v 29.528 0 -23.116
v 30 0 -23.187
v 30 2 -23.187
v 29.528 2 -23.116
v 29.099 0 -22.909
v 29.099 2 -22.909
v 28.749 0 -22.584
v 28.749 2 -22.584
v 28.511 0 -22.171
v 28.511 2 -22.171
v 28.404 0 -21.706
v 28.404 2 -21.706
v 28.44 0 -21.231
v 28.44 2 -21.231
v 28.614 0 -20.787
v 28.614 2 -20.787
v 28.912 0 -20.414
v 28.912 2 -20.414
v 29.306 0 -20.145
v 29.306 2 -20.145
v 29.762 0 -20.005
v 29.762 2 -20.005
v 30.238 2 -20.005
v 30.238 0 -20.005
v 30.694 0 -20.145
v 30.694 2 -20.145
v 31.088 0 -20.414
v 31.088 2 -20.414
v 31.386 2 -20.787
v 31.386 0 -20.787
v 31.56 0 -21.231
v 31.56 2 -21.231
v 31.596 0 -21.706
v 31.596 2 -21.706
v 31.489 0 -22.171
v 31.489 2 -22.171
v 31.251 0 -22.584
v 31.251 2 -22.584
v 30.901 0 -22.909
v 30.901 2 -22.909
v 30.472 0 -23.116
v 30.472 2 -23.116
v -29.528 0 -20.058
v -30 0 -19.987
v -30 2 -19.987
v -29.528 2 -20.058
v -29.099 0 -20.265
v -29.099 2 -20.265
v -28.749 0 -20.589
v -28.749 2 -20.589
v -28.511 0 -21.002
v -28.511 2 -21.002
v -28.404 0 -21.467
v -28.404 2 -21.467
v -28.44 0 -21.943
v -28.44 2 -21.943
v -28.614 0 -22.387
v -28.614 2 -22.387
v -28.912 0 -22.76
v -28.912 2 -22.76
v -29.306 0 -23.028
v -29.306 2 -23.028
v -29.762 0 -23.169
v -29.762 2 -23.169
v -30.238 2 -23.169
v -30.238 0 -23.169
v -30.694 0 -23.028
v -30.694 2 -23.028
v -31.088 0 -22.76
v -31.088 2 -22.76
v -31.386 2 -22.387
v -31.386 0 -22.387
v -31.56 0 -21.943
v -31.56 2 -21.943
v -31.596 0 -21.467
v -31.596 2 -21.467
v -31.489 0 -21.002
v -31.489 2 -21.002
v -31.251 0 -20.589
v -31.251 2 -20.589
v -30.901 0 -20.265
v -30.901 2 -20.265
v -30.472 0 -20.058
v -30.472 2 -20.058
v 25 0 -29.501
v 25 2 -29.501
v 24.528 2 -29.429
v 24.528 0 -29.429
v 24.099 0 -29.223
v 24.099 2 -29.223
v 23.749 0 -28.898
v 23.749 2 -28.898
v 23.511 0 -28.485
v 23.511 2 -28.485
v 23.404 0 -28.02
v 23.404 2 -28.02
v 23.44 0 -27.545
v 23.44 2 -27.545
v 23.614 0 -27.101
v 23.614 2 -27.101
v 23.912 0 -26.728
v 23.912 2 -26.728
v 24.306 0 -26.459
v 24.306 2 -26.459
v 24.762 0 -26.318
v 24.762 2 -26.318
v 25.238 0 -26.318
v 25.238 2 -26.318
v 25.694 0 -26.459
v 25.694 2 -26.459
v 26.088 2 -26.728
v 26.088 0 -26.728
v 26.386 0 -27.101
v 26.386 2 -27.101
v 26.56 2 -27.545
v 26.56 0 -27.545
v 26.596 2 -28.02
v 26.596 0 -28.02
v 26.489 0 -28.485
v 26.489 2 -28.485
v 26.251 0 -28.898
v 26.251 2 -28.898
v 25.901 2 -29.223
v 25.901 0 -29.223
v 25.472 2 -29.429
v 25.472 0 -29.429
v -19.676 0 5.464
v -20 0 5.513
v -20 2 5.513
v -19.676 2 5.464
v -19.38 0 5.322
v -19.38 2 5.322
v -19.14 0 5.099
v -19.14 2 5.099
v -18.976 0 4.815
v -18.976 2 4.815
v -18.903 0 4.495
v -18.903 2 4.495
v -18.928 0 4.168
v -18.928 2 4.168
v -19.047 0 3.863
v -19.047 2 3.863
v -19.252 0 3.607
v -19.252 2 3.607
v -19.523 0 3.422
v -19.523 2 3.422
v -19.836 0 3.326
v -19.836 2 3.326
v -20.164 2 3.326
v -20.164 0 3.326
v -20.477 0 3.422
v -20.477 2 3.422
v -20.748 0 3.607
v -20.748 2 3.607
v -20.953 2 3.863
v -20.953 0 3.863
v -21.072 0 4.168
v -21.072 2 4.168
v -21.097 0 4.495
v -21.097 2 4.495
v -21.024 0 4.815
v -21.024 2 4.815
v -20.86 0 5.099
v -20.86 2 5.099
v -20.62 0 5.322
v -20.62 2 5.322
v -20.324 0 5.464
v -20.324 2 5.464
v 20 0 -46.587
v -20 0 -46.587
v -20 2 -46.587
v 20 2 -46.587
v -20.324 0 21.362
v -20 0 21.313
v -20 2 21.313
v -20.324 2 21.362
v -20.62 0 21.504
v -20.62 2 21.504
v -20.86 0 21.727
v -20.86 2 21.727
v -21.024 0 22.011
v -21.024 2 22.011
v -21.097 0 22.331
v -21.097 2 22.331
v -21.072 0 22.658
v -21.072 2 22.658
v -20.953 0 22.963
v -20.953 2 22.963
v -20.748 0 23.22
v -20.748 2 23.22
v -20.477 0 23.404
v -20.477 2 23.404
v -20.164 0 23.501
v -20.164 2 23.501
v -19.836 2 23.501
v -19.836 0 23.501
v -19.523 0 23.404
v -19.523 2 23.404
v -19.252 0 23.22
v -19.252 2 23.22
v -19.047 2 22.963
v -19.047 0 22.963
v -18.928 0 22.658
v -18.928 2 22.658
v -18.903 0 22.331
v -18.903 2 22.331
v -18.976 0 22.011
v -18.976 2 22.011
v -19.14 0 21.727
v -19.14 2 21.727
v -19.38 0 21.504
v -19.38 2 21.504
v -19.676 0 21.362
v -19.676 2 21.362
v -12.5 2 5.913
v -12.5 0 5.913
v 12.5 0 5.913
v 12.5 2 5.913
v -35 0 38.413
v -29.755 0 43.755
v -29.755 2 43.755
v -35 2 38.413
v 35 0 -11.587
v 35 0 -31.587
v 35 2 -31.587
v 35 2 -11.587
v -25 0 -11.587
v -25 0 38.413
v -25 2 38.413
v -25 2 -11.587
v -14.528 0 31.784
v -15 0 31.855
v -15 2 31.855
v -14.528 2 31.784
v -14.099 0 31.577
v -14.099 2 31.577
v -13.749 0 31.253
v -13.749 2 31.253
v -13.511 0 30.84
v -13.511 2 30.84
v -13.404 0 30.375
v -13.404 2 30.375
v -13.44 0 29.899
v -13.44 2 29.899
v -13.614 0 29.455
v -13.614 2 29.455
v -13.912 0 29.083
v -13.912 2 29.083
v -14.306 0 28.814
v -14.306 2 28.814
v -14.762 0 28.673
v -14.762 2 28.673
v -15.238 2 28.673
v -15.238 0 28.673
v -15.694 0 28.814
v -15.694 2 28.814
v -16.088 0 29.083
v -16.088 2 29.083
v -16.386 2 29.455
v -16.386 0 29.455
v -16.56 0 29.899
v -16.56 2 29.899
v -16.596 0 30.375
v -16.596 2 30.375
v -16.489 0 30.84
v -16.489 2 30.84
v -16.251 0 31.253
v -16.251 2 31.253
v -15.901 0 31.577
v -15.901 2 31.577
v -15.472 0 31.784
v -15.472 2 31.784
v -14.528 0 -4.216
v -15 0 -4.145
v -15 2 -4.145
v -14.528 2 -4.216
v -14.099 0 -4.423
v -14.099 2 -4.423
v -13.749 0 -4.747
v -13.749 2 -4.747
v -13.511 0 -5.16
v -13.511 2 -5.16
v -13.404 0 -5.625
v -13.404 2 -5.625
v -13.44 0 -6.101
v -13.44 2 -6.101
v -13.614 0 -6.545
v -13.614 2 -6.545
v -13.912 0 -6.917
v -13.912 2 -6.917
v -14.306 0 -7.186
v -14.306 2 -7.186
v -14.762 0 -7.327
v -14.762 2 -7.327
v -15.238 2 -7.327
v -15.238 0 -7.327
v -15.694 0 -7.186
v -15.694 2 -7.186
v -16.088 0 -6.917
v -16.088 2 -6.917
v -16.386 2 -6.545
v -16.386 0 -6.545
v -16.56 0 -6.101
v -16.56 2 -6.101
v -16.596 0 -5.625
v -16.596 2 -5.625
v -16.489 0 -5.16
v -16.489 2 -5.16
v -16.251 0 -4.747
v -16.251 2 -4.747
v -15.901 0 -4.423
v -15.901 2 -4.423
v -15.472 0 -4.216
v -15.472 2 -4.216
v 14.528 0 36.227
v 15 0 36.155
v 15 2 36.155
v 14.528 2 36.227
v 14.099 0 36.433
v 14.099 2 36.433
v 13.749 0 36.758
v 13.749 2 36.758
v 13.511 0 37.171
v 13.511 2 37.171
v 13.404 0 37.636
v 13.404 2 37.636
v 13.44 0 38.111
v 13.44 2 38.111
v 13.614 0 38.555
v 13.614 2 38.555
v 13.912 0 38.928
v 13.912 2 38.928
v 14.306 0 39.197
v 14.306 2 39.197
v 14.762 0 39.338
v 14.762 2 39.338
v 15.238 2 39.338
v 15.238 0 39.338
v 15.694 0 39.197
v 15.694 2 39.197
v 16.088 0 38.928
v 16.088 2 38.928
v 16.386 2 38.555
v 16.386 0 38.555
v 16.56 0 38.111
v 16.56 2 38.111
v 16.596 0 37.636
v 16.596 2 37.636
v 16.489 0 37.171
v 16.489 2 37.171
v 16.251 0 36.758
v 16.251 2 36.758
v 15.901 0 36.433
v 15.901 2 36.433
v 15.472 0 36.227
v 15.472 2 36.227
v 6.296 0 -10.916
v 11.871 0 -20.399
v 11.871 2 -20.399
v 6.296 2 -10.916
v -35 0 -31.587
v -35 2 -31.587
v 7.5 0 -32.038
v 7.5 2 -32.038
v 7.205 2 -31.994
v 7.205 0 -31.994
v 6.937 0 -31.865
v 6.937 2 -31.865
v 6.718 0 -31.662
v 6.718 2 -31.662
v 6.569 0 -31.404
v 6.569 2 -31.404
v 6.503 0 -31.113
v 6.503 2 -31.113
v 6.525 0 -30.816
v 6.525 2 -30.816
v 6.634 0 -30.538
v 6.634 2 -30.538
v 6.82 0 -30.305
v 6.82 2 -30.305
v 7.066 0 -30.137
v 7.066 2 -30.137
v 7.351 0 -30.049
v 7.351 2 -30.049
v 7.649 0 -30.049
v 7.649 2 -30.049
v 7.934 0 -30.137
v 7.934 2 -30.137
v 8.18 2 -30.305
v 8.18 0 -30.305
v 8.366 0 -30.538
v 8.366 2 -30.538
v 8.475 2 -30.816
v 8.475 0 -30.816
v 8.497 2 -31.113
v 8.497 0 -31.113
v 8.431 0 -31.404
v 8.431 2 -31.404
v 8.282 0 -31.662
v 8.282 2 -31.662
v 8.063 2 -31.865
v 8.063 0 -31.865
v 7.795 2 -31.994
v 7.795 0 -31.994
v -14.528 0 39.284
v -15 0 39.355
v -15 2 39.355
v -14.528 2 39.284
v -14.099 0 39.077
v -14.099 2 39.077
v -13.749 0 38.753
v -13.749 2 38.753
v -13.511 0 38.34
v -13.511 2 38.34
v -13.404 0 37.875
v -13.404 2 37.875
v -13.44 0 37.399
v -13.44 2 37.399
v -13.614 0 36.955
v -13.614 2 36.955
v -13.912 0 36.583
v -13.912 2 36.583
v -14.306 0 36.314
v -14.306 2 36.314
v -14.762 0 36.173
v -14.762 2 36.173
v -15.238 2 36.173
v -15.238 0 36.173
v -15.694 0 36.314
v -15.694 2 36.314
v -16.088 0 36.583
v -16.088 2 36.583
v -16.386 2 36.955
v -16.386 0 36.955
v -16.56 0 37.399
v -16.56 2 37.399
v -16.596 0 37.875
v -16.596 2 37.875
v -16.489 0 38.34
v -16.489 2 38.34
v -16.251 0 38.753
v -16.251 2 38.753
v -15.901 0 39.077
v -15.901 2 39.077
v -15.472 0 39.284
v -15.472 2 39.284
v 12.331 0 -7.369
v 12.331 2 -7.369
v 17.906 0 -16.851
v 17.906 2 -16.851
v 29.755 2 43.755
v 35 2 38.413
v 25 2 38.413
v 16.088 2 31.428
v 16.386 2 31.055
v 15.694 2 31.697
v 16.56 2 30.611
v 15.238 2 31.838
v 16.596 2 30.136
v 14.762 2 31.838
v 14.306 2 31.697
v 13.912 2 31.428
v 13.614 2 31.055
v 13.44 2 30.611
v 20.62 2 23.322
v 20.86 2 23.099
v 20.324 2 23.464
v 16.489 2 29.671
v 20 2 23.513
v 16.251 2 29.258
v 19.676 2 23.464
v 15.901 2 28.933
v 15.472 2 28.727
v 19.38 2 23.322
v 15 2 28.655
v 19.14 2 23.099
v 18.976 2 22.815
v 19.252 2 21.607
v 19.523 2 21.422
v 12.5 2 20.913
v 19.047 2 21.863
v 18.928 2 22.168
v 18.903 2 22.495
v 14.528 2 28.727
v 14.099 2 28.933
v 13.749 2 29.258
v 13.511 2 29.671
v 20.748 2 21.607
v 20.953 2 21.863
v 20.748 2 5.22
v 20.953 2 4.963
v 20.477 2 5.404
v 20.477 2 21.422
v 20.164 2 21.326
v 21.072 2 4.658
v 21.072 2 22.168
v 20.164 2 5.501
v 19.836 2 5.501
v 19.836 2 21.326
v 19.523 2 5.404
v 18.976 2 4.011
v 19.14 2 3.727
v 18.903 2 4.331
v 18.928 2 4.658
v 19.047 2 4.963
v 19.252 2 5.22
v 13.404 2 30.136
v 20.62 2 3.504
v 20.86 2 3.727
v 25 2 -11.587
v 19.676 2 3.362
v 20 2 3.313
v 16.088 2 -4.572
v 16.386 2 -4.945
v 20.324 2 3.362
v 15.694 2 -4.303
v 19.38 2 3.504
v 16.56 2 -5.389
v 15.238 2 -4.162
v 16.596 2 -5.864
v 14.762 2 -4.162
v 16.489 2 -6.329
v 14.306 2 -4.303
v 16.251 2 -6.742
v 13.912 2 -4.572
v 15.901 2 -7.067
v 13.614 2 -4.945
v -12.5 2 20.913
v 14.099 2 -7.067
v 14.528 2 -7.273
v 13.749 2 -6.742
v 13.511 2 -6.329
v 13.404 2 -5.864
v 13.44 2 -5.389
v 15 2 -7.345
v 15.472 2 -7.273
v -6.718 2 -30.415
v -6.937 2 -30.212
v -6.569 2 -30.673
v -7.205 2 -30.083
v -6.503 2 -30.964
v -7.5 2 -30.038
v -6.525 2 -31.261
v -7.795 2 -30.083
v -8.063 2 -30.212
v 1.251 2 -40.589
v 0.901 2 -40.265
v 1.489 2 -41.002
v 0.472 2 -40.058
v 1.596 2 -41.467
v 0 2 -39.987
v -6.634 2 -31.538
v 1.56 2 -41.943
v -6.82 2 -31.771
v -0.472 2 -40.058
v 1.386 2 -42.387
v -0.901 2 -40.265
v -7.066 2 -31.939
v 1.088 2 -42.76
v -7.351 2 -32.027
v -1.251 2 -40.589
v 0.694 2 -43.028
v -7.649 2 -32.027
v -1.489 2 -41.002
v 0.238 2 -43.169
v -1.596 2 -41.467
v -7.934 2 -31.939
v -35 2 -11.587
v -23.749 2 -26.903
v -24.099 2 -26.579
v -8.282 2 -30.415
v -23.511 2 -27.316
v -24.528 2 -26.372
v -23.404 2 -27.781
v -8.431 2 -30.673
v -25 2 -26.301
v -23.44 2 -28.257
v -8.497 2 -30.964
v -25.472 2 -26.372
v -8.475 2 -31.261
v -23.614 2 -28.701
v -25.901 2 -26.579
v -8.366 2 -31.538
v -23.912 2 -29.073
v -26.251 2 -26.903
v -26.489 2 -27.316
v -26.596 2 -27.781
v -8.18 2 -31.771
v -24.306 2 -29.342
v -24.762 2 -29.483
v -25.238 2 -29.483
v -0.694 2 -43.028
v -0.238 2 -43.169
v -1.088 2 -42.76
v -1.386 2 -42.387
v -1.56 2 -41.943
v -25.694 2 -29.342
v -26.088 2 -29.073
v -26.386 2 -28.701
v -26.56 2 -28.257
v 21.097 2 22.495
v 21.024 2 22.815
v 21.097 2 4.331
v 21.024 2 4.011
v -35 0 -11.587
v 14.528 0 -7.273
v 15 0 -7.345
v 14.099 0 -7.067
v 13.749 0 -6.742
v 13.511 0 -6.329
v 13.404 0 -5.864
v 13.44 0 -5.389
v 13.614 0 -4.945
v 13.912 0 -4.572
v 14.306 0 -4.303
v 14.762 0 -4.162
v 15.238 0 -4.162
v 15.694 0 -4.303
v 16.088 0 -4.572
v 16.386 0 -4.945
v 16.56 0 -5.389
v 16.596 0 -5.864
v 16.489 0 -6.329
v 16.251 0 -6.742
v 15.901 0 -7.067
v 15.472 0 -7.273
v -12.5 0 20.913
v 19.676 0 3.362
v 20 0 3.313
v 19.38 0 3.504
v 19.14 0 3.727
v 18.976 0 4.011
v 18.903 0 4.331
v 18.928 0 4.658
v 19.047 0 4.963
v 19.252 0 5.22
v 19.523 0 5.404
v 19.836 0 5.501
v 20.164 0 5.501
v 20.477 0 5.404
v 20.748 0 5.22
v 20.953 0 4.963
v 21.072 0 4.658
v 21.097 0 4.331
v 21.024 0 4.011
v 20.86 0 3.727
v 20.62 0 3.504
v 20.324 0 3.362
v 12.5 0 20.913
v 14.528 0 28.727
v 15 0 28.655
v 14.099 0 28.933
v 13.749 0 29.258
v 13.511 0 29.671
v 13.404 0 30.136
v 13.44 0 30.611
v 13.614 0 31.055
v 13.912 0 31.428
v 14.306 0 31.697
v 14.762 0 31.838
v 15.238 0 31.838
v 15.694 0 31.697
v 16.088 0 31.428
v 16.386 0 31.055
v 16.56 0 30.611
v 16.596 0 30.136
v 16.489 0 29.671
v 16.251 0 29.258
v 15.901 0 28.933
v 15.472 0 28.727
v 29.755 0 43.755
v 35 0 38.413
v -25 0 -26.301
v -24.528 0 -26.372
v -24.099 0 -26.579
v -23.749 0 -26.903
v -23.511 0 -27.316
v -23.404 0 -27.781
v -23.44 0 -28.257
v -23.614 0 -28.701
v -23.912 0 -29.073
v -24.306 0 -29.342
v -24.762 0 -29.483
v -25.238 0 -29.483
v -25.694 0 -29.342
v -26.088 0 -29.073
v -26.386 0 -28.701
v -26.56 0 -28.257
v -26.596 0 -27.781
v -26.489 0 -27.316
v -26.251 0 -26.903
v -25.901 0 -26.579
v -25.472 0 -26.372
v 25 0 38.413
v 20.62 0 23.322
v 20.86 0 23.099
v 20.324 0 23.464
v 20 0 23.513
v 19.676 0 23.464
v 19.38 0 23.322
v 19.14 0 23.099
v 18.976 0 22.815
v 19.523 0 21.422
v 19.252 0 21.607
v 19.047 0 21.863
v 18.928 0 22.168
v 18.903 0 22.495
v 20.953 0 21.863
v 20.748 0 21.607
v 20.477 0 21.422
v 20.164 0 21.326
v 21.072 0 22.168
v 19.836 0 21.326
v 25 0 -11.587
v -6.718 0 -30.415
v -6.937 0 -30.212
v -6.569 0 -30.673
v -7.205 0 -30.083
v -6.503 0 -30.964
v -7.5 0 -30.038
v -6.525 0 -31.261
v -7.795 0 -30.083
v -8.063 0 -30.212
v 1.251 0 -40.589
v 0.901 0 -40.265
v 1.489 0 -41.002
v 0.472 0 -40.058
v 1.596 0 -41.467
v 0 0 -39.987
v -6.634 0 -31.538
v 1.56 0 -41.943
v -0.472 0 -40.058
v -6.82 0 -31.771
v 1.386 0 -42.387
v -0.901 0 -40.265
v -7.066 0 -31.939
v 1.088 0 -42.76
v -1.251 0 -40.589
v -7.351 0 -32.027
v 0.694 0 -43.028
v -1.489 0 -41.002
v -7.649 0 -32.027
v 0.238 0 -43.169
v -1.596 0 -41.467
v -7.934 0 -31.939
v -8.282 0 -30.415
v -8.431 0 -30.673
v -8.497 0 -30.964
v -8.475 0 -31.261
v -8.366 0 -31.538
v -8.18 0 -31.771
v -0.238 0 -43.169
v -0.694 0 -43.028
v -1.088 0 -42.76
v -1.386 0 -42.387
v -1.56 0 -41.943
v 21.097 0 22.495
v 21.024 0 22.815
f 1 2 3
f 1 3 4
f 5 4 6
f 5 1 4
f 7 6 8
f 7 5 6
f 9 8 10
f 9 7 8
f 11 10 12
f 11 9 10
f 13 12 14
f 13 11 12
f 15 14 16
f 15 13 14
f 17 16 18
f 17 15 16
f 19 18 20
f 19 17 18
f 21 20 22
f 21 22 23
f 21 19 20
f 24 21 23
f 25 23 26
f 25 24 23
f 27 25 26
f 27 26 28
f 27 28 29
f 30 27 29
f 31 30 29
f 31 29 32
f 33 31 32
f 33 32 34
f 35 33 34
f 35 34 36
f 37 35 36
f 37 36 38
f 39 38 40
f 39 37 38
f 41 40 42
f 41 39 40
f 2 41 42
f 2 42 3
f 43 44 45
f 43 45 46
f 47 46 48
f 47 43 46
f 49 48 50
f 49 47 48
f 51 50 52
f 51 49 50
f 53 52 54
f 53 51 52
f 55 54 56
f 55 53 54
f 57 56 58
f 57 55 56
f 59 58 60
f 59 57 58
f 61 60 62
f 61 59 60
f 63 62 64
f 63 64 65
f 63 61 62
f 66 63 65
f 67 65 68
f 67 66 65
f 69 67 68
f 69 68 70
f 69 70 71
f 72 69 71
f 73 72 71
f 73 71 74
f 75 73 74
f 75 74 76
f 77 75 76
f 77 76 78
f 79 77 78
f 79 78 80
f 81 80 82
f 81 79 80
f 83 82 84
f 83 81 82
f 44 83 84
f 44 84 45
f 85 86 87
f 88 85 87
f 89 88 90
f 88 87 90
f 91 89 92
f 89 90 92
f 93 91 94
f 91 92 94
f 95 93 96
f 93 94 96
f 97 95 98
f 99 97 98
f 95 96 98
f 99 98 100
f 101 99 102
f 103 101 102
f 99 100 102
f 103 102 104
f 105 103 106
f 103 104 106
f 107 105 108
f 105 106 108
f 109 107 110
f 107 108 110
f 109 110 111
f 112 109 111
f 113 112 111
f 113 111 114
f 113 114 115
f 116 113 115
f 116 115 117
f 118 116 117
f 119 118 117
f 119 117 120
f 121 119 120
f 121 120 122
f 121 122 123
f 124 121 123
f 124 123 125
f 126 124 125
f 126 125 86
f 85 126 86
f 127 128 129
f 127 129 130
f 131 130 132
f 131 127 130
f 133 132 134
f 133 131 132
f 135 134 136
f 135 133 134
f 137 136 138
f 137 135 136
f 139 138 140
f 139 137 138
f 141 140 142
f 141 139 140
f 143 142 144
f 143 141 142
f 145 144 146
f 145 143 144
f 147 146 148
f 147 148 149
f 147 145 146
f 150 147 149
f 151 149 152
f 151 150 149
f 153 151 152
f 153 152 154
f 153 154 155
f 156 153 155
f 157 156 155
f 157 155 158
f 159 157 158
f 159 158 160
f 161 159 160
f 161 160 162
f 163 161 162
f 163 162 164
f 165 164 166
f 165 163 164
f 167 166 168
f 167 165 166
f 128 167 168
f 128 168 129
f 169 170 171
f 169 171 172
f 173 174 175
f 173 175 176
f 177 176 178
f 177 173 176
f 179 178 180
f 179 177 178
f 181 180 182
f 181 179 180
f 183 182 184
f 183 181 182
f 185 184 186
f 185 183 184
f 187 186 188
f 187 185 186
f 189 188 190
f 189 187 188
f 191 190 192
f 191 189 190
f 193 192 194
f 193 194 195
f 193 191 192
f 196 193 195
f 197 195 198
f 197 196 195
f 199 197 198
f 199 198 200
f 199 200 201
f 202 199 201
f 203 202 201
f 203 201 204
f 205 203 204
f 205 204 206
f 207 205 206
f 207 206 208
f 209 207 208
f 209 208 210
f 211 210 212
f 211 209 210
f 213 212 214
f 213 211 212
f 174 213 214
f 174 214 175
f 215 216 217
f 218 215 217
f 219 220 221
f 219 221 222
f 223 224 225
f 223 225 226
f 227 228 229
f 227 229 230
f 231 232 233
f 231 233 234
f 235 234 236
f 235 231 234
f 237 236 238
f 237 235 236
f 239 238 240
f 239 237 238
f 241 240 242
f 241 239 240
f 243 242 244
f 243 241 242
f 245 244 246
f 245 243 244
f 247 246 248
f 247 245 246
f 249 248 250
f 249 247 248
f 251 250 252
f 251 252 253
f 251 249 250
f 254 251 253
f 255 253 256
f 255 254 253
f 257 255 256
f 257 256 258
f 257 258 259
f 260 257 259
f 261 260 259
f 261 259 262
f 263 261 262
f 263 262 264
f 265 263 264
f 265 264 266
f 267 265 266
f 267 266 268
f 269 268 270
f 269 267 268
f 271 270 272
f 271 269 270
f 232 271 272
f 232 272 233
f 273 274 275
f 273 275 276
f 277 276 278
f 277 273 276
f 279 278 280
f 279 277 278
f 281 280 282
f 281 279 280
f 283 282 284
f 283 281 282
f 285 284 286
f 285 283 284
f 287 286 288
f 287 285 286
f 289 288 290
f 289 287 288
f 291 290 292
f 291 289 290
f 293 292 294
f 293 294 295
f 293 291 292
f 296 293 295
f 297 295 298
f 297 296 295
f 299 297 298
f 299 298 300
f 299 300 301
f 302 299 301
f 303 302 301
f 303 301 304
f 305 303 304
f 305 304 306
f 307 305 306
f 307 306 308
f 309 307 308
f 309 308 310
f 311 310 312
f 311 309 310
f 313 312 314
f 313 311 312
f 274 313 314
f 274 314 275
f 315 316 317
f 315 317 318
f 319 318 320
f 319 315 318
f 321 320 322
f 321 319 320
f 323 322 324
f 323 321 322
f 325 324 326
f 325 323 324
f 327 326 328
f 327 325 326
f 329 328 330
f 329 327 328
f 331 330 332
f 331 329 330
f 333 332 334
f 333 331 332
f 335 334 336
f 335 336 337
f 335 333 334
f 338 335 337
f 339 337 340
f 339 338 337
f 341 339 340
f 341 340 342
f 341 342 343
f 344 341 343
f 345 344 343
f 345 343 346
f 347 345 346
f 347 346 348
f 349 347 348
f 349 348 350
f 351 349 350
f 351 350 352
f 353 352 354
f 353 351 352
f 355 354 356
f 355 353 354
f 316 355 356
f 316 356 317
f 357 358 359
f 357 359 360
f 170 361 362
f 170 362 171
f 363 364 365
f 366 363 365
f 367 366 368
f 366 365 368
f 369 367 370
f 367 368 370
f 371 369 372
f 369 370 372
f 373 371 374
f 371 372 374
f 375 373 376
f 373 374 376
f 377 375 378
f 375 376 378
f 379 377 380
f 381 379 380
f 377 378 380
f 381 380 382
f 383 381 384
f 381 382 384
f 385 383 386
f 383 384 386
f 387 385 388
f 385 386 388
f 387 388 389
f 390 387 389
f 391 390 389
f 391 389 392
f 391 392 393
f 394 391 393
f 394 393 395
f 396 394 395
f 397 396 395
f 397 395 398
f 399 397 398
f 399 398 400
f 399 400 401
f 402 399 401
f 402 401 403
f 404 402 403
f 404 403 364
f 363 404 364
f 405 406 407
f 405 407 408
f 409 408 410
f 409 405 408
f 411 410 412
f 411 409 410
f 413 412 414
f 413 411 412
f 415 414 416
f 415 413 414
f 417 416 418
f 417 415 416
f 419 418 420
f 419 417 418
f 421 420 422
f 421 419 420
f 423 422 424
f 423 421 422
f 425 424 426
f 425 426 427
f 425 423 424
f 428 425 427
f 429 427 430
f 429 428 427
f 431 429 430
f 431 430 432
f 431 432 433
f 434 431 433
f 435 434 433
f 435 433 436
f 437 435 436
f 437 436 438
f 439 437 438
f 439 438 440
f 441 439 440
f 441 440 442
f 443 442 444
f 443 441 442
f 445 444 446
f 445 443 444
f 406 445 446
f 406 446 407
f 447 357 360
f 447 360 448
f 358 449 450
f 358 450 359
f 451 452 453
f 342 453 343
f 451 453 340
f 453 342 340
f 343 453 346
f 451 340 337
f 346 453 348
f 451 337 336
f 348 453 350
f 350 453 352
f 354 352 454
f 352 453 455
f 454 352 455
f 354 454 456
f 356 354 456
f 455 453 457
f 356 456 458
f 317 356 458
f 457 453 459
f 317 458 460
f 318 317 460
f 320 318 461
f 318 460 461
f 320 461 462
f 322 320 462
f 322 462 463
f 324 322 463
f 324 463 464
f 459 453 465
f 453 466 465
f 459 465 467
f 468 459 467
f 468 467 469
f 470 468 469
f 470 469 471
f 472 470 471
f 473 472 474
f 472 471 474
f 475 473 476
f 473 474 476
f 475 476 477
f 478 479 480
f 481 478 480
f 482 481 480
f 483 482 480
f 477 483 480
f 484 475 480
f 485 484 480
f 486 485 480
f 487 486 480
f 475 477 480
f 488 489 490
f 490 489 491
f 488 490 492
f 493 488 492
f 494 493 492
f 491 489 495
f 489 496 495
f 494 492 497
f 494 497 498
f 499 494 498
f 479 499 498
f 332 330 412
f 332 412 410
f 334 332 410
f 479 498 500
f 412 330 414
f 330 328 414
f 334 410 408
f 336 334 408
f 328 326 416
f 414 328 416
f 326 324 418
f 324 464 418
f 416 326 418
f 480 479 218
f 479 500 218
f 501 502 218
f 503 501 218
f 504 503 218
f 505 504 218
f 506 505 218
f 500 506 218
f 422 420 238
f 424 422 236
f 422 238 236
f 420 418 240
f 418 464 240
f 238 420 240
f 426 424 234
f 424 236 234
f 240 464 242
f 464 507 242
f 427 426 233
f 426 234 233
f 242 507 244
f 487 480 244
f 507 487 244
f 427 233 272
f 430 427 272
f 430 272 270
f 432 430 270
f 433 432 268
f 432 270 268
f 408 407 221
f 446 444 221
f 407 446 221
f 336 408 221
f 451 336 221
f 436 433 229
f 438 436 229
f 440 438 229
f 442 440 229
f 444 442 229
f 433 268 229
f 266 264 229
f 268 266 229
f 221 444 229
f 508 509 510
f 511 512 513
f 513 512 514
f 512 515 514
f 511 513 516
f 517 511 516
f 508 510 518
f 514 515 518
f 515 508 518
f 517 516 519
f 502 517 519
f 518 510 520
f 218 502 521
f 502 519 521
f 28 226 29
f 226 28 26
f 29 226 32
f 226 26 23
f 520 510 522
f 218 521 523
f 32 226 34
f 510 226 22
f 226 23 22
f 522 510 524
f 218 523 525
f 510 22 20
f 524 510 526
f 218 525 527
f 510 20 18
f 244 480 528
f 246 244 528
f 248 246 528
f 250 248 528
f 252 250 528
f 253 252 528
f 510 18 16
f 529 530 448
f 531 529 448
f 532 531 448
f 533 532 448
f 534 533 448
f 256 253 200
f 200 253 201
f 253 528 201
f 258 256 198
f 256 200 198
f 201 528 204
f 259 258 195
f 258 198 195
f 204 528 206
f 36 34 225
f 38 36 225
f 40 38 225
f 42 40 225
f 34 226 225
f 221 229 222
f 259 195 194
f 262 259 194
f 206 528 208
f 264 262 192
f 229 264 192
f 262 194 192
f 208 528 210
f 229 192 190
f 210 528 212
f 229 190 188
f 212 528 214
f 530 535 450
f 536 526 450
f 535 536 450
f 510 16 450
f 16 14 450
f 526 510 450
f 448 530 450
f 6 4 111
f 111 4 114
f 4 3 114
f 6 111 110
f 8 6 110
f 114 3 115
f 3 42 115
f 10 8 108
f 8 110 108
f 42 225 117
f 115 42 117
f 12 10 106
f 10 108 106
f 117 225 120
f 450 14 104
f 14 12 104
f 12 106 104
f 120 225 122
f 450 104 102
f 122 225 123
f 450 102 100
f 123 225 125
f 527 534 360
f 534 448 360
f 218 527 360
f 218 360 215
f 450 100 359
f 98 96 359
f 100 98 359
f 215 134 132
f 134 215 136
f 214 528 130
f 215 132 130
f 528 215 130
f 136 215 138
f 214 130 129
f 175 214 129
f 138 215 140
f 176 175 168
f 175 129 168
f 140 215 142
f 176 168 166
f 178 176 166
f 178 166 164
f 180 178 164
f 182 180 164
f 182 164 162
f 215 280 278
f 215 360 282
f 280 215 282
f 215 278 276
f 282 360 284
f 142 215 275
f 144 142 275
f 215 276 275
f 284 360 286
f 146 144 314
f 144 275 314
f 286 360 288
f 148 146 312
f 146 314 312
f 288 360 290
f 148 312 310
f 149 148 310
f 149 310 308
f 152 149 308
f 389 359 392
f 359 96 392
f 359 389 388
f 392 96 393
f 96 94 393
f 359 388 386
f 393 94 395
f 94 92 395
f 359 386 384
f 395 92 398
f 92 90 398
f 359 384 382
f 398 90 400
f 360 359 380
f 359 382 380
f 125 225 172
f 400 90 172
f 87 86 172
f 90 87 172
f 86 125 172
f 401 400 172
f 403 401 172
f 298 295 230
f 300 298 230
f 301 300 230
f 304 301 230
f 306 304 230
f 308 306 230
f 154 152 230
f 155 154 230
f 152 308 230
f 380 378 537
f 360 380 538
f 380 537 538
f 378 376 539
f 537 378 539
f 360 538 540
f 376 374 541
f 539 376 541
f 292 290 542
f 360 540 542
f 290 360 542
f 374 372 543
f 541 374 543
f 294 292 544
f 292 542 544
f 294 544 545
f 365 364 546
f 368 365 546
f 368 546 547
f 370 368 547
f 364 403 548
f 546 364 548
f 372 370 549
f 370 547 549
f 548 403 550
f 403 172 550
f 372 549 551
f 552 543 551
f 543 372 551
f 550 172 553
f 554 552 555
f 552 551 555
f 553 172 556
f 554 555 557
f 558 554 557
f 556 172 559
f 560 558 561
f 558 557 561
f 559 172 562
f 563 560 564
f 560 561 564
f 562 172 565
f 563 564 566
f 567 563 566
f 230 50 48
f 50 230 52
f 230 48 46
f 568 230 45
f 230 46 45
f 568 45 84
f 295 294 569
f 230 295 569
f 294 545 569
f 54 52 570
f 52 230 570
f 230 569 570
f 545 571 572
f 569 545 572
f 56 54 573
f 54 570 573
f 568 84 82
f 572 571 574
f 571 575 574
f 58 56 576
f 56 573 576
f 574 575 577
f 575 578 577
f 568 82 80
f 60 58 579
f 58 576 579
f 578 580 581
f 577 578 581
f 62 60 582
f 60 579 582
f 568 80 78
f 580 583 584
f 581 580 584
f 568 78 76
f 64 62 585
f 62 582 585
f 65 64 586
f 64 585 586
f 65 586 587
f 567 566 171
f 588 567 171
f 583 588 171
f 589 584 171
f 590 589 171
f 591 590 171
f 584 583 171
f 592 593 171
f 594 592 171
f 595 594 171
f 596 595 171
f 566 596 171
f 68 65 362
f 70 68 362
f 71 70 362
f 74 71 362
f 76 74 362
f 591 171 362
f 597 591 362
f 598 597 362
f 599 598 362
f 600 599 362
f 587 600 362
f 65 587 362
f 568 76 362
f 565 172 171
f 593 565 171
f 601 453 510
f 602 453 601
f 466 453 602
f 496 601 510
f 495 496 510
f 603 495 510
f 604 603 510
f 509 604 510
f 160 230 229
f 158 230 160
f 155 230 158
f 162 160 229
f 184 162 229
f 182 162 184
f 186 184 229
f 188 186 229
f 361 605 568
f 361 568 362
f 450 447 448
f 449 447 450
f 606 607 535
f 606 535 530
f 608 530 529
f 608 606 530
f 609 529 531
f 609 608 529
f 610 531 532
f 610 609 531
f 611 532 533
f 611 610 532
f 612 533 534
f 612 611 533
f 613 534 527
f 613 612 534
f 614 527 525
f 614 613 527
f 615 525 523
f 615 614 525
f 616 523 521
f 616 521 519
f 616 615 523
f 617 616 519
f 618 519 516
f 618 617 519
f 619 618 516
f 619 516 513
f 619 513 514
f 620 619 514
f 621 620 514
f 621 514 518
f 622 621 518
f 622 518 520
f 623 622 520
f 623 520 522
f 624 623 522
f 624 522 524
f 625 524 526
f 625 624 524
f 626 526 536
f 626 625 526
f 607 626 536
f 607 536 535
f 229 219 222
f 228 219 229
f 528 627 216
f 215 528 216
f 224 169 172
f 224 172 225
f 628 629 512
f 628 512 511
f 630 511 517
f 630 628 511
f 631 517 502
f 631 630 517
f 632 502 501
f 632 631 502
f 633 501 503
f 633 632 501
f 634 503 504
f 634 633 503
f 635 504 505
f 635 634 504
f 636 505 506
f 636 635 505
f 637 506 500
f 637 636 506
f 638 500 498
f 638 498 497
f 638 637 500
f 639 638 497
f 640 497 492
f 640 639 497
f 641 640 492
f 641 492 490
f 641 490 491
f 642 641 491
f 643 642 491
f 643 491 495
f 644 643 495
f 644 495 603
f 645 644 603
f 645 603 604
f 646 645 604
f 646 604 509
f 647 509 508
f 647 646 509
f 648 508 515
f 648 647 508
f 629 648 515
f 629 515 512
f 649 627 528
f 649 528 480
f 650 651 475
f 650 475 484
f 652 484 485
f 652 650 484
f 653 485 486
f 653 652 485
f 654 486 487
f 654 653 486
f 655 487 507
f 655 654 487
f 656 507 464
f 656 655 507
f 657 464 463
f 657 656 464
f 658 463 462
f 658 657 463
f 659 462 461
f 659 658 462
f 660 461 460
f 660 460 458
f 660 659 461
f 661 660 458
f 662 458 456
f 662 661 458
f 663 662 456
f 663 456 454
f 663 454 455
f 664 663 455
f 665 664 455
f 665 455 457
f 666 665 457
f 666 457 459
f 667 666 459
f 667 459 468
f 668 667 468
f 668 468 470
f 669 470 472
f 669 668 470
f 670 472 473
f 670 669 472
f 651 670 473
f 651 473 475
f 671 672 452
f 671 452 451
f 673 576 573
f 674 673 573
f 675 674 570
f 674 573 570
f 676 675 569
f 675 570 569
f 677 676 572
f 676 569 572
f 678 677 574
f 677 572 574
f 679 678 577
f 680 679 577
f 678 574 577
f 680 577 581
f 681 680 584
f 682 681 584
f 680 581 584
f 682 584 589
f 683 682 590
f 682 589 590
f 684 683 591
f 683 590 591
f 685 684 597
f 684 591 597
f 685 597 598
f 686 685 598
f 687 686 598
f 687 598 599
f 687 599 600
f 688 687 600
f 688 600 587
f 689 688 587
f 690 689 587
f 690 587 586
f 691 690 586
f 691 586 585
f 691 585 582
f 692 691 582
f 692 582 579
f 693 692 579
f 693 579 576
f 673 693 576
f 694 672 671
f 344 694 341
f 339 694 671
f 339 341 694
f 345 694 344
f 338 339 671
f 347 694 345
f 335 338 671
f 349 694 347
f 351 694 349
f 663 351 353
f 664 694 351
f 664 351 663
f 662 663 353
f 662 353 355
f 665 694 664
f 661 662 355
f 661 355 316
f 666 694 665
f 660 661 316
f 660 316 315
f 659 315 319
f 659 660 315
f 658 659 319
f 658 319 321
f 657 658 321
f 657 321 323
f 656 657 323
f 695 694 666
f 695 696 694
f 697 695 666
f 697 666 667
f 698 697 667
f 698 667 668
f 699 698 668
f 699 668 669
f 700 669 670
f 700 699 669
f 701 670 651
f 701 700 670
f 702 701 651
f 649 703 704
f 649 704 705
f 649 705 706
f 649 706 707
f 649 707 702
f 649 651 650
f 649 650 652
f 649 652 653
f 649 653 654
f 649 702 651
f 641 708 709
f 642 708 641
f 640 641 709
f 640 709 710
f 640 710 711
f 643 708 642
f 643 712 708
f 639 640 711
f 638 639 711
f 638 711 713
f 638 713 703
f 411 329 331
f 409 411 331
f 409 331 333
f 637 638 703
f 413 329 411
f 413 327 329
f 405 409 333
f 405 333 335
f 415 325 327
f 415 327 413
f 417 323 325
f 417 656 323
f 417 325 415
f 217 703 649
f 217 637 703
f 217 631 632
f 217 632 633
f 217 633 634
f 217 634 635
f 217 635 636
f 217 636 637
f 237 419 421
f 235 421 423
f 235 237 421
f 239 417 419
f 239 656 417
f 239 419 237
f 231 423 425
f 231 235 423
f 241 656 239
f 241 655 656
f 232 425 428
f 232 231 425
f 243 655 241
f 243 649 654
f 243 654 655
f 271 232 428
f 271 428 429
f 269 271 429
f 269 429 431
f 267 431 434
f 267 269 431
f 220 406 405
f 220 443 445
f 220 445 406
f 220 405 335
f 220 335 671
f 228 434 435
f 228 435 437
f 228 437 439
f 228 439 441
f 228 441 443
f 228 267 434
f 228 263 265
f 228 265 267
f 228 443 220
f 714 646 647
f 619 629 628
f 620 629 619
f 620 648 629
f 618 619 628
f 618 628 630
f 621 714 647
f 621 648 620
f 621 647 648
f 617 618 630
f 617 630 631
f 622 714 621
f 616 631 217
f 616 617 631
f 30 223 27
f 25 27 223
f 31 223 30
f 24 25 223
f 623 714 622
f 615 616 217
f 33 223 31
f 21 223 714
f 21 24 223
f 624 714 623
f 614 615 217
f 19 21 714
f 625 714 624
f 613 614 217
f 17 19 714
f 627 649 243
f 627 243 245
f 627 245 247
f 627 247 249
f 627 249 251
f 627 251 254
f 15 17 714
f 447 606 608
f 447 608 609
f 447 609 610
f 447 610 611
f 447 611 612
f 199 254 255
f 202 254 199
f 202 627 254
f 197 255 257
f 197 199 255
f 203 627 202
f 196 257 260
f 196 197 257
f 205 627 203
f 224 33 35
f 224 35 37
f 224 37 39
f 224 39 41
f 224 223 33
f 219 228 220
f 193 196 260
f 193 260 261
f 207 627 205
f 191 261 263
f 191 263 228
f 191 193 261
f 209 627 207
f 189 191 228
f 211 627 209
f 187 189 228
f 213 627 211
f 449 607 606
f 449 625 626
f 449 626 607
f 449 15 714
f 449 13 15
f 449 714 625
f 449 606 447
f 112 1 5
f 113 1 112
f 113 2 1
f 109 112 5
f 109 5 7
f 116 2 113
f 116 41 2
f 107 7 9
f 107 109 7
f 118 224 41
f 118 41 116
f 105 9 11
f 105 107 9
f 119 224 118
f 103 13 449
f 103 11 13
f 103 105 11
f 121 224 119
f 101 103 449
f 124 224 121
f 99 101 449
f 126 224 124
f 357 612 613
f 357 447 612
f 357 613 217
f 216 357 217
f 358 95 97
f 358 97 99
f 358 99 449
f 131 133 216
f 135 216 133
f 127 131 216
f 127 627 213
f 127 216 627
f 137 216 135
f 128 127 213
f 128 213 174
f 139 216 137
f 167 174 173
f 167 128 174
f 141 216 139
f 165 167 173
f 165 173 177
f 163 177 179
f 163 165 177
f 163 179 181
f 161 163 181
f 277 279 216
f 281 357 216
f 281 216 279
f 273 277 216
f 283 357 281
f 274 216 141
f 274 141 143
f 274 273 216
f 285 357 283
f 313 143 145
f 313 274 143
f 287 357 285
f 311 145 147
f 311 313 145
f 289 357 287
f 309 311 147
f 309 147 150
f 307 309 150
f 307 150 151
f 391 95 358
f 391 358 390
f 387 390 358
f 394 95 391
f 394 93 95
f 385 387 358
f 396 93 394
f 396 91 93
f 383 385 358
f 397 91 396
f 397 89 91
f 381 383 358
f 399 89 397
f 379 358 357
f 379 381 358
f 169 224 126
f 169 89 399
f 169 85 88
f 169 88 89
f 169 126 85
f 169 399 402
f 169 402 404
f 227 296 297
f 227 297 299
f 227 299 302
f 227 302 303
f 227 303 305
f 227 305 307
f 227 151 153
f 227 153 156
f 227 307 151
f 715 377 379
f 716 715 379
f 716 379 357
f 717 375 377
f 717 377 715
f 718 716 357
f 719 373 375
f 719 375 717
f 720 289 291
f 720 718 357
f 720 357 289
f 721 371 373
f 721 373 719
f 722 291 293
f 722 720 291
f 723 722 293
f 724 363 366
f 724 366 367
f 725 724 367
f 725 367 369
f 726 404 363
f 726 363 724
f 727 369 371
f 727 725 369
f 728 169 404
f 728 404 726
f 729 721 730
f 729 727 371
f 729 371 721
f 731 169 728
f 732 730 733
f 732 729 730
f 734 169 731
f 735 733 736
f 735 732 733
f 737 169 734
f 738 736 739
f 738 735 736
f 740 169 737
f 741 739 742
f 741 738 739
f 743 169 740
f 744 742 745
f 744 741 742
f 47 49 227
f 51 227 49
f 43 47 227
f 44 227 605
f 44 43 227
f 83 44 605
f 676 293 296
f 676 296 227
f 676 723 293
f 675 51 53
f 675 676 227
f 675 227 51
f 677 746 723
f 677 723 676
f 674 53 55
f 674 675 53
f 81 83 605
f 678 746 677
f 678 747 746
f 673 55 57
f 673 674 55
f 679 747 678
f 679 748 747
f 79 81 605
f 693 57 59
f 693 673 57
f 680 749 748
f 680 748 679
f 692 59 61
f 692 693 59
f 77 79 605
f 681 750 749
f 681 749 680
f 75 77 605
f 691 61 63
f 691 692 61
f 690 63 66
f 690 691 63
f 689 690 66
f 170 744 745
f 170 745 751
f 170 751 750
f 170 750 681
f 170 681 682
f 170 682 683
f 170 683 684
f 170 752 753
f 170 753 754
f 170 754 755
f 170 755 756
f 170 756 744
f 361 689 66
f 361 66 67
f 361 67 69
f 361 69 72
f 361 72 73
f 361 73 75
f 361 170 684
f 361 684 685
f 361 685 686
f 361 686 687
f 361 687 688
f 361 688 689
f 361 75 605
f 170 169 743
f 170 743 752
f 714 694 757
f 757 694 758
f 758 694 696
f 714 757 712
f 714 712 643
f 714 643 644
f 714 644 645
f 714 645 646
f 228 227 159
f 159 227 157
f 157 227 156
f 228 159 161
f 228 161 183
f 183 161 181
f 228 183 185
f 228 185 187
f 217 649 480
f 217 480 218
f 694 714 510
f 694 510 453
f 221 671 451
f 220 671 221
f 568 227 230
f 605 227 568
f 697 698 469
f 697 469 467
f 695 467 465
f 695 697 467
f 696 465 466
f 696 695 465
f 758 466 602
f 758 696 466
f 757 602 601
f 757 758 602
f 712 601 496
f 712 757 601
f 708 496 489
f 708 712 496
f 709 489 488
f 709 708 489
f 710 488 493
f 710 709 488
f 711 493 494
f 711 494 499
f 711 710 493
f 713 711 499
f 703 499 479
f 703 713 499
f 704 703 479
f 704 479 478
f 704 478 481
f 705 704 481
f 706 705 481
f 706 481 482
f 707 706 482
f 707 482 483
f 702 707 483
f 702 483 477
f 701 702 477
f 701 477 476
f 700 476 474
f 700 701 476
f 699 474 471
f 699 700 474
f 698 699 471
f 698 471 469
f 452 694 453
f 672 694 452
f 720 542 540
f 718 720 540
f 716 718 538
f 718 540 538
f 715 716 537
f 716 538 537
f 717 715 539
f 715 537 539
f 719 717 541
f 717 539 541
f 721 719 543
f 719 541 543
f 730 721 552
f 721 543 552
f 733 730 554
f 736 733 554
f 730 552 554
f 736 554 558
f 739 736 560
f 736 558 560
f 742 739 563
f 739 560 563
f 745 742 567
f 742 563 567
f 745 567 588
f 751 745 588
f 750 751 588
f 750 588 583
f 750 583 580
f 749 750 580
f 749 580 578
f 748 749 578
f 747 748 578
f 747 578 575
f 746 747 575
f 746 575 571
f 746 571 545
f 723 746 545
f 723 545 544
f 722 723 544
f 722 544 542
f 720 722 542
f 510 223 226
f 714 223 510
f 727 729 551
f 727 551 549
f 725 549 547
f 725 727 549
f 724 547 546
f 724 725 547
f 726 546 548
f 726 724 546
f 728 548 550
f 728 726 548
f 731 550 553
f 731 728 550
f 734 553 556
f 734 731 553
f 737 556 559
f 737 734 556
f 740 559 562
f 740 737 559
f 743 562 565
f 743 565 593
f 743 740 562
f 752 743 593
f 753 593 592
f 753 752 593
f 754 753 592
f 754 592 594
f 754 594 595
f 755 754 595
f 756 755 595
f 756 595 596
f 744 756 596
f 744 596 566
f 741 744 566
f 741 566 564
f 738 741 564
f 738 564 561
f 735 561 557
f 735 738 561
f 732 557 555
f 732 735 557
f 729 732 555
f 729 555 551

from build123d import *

# Parameters (mm, degrees)
SKETCH1_R           = 1.6
SKETCH1_R_2         = 1.1
SKETCH1_W           = 25
SKETCH1_H           = 15
BOSS_EXTRUDE1_DEPTH = 2
SKETCH2_R           = 1.6
CUT_EXTRUDE1_DEPTH  = 15
SKETCH3_R           = 1
CUT_EXTRUDE2_DEPTH  = 59.303758671


with BuildPart() as part:
    # Sketch1 → Boss-Extrude1 (new body)
    with BuildSketch(Plane(origin=(0, 0, 0), x_dir=(1, 0, 0), z_dir=(0, 1, 0))):
        Polygon((-20, 46.586782193), (20, 46.586782193), (35, 31.586782193), (35, 11.586782193), (25, 11.586782193), (25, -38.413217807), (35, -38.413217807), (29.754571716, -43.75543078), (-29.754571716, -43.75543078), (-35, -38.413217807), (-25, -38.413217807), (-25, 11.586782193), (-35, 11.586782193), (-35, 31.586782193), align=None)
        with Locations(Location((-30, 21.586782193, 0), (0, 0, 270))):
            Circle(SKETCH1_R, mode=Mode.SUBTRACT)
        with Locations(Location((30, 21.586782193, 0), (0, 0, 90))):
            Circle(SKETCH1_R, mode=Mode.SUBTRACT)
        with Locations(Location((0, 41.586782193, 0), (0, 0, 270))):
            Circle(SKETCH1_R, mode=Mode.SUBTRACT)
        with Locations(Location((-20, -4.413217807, 0), (0, 0, 270))):
            Circle(SKETCH1_R_2, mode=Mode.SUBTRACT)
        with Locations(Location((-20, -22.413217807, 0), (0, 0, 90))):
            Circle(SKETCH1_R_2, mode=Mode.SUBTRACT)
        with Locations(Location((20, -4.413217807, 0), (0, 0, 90))):
            Circle(SKETCH1_R_2, mode=Mode.SUBTRACT)
        with Locations(Location((20, -22.413217807, 0), (0, 0, 270))):
            Circle(SKETCH1_R_2, mode=Mode.SUBTRACT)
        with Locations(Location((-15, -37.75543078, 0), (0, 0, 270))):
            Circle(SKETCH1_R, mode=Mode.SUBTRACT)
        with Locations(Location((15, -37.75543078, 0), (0, 0, 90))):
            Circle(SKETCH1_R, mode=Mode.SUBTRACT)
        with Locations(Location((-15, 5.74456922, 0), (0, 0, 270))):
            Circle(SKETCH1_R, mode=Mode.SUBTRACT)
        with Locations(Location((15, 5.74456922, 0), (0, 0, 90))):
            Circle(SKETCH1_R, mode=Mode.SUBTRACT)
        with Locations(Location((-15, -30.25543078, 0), (0, 0, 270))):
            Circle(SKETCH1_R, mode=Mode.SUBTRACT)
        with Locations(Location((15, -30.25543078, 0), (0, 0, 90))):
            Circle(SKETCH1_R, mode=Mode.SUBTRACT)
        Polygon((12.330705785, 7.368716231), (17.905727496, 16.851286185), (11.871364798, 20.399027274), (6.296343087, 10.91645732), align=None, mode=Mode.SUBTRACT)
        with Locations((0, -13.413217807)):
            Rectangle(SKETCH1_W, SKETCH1_H, mode=Mode.SUBTRACT)
    extrude(amount=BOSS_EXTRUDE1_DEPTH)

    # Sketch2 → Cut-Extrude1 (cut)
    with BuildSketch(Plane(origin=(0, 2, 0), x_dir=(1, 0, 0), z_dir=(0, 1, 0))):
        with Locations(Location((-25, 27.900566449, 0), (0, 0, 270))):
            Circle(SKETCH2_R)
        with Locations(Location((25, 27.900566449, 0), (0, 0, 90))):
            Circle(SKETCH2_R)
    extrude(amount=-CUT_EXTRUDE1_DEPTH, mode=Mode.SUBTRACT)

    # Sketch3 → Cut-Extrude2 (cut, through all)
    with BuildSketch(Plane(origin=(0, 2, 0), x_dir=(1, 0, 0), z_dir=(0, 1, 0))):
        with Locations(Location((-7.5, 31.038288012, 0), (0, 0, 270))):
            Circle(SKETCH3_R)
        with Locations(Location((7.5, 31.038288012, 0), (0, 0, 90))):
            Circle(SKETCH3_R)
    extrude(amount=-CUT_EXTRUDE2_DEPTH, mode=Mode.SUBTRACT)


solid = part.part
